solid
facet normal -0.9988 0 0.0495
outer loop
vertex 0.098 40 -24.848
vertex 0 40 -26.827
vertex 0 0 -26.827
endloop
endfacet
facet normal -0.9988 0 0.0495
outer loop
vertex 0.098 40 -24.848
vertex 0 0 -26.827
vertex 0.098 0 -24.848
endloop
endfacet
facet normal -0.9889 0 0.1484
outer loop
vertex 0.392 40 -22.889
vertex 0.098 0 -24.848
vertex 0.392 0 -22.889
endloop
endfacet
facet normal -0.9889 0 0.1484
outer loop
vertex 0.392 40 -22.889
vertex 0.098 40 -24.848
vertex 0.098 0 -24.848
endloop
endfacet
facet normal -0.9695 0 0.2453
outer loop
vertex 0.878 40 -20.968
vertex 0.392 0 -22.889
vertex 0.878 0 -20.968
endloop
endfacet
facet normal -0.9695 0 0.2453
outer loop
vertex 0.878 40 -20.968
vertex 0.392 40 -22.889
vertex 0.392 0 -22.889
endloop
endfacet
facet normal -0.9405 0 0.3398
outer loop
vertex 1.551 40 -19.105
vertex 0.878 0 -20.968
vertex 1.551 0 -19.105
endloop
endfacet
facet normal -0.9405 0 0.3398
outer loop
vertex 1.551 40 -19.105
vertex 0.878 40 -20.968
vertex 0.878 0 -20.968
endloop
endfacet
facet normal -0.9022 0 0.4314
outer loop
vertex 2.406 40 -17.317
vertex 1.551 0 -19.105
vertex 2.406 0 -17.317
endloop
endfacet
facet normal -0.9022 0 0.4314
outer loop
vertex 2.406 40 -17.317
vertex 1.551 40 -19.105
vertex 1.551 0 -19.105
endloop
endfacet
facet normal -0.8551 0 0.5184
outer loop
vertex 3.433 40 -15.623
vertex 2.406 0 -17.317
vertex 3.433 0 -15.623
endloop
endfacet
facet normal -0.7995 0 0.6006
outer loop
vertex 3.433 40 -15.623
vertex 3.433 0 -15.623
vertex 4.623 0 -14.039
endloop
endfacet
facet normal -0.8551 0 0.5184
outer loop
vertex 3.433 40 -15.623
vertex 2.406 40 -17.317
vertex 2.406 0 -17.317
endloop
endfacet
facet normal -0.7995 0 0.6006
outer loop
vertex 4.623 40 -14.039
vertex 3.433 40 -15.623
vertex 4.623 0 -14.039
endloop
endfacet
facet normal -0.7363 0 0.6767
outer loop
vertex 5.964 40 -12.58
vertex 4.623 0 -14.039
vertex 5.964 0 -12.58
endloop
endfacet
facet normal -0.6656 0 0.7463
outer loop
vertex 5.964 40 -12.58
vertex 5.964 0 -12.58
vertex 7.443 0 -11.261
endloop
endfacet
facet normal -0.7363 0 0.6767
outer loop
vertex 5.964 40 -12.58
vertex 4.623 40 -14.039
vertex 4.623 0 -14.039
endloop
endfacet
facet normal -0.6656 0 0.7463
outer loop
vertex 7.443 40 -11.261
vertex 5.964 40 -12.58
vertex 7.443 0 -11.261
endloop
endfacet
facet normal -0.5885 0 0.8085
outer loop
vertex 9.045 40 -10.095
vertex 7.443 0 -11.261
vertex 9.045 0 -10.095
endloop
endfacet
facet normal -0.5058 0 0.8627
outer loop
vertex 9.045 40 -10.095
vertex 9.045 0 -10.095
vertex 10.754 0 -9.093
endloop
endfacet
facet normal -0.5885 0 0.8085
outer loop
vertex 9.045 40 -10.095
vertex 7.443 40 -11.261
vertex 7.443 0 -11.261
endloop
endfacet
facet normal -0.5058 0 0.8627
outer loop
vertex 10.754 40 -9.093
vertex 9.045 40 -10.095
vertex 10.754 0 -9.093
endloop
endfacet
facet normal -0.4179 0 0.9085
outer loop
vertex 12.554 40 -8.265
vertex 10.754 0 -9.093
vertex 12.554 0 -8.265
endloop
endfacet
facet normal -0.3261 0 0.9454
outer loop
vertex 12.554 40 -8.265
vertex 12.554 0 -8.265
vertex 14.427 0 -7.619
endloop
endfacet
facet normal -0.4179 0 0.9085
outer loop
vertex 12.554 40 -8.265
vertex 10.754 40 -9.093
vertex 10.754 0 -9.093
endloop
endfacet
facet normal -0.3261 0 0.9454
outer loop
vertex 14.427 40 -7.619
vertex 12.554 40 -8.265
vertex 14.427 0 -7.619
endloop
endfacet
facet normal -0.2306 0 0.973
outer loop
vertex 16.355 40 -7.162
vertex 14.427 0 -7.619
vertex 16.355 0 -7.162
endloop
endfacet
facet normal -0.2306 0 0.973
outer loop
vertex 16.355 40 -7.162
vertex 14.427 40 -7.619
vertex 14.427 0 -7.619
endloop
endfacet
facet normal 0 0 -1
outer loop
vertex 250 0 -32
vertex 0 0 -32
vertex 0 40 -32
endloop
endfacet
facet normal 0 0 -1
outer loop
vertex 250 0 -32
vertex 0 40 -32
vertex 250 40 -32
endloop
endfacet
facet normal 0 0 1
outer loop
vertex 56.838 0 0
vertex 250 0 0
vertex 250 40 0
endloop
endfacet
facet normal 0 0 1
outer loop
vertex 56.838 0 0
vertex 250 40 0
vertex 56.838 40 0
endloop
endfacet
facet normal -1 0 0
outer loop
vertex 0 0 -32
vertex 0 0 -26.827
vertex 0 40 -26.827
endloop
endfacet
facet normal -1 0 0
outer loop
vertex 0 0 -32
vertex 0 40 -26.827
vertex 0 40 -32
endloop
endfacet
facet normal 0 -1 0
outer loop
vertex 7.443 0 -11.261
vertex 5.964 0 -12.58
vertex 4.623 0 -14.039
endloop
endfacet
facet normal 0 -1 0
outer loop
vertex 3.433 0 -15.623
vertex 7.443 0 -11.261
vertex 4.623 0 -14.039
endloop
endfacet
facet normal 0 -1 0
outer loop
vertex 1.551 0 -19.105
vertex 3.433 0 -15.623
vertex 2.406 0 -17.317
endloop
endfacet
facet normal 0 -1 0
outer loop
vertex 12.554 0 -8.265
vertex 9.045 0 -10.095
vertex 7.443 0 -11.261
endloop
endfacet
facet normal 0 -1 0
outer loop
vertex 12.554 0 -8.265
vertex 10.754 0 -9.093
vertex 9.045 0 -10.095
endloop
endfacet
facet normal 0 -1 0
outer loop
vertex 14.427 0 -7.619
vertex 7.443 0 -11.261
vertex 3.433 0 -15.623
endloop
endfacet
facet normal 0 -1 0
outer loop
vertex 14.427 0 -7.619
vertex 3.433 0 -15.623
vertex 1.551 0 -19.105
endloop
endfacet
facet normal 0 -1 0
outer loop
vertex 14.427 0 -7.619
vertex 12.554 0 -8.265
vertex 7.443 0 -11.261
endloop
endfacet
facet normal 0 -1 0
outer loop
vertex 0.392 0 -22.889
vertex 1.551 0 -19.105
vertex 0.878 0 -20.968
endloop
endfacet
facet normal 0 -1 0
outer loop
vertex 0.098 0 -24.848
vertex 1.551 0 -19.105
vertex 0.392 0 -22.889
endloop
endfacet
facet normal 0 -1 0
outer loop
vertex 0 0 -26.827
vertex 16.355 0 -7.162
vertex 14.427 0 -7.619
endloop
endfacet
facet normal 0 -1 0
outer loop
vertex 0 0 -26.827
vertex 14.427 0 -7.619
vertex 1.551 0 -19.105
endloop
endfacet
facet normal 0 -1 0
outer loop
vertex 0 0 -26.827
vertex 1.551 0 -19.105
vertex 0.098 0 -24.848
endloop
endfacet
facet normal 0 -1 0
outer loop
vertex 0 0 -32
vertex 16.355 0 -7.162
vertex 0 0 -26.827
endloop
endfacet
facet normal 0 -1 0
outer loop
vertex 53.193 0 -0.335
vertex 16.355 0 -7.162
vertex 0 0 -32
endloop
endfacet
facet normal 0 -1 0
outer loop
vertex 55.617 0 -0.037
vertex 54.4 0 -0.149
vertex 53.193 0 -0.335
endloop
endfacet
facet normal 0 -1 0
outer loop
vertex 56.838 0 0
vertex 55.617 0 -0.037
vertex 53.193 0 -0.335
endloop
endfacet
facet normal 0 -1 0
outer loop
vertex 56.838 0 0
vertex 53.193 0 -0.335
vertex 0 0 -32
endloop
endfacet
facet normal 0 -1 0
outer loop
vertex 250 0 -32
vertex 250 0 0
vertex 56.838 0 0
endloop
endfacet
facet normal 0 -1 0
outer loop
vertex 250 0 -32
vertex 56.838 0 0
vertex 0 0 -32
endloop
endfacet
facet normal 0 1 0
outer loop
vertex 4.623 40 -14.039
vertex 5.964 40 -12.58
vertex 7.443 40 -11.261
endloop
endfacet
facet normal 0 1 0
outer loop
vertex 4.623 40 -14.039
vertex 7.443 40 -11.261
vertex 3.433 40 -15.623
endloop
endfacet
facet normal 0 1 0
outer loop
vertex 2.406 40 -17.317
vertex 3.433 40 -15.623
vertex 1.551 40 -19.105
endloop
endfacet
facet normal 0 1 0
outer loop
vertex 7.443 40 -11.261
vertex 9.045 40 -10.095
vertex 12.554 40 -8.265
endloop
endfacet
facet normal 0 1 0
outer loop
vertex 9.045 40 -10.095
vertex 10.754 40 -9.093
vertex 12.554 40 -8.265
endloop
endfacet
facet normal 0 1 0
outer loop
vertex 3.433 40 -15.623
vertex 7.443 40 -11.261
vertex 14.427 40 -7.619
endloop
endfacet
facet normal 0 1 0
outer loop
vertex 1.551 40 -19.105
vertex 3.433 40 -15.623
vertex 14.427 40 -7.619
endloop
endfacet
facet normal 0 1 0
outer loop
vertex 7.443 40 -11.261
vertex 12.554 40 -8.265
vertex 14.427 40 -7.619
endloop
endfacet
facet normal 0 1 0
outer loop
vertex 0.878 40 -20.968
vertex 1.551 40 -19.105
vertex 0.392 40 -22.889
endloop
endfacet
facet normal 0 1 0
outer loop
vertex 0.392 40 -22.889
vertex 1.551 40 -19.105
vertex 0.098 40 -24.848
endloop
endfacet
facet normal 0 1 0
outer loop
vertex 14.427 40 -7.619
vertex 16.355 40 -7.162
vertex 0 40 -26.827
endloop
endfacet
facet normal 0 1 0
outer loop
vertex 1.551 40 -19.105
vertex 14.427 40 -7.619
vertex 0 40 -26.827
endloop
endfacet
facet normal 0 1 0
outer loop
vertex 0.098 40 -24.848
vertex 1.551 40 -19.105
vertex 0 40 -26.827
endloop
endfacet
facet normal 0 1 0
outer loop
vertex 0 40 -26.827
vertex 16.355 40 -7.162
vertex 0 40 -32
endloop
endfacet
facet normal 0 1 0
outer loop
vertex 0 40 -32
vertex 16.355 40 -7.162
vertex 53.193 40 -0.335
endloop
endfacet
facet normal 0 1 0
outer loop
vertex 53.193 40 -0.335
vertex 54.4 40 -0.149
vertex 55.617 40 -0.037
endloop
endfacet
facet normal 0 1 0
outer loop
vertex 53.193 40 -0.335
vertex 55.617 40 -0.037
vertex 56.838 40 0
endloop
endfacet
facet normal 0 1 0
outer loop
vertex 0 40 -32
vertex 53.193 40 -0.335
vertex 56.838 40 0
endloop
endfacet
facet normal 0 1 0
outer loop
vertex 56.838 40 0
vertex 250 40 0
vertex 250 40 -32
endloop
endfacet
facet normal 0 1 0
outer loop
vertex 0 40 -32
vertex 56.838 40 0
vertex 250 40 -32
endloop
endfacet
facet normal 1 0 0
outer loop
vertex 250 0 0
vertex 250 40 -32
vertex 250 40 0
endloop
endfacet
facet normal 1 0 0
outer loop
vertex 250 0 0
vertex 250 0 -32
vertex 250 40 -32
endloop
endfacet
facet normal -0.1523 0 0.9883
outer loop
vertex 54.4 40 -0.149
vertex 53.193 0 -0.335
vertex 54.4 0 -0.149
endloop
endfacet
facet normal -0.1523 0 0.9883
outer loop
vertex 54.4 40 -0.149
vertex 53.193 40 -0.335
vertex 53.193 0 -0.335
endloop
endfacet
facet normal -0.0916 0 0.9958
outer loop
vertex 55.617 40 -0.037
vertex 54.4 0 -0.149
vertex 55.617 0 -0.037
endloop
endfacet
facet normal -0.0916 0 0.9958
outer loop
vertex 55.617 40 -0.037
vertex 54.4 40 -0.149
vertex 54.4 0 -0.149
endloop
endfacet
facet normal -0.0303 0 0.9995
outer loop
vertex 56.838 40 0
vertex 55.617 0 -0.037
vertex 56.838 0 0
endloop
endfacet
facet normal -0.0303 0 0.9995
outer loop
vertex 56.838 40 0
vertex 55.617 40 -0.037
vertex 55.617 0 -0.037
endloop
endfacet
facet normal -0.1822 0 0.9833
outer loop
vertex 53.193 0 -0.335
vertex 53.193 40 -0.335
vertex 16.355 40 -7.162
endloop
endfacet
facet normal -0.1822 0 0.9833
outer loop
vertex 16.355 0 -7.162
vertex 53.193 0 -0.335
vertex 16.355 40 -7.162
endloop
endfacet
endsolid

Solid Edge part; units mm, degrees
sketch "Sketch1" plane through (0, 0, 0) normal (0, -1, 0) x (1, 0, 0)
  line L0 (0, -32) -> (250, -32)
  line L1 (250, -32) -> (250, 0)
  line L2 (250, 0) -> (0, 0)
  line L3 (0, 0) -> (0, -32)
extrude "Protrusion1" add sketch "Sketch1" against normal blind 40
sketch "Sketch2" plane through (125, 0, -16) normal (0, -1, 0) x (1, 0, 0)
  line L0 (-70, 16) -> (-125, 5.8064)
  line L1 (-125, 5.8064) -> (-125, 16)
  line L2 (-125, 16) -> (-70, 16)
extrude "ExtrudedCutout_1" cut sketch "Sketch2" against normal blind 40
fillet "Round_1" radius 20 2 edges at (0, 20, -10.1936) (55, 20, 0)
